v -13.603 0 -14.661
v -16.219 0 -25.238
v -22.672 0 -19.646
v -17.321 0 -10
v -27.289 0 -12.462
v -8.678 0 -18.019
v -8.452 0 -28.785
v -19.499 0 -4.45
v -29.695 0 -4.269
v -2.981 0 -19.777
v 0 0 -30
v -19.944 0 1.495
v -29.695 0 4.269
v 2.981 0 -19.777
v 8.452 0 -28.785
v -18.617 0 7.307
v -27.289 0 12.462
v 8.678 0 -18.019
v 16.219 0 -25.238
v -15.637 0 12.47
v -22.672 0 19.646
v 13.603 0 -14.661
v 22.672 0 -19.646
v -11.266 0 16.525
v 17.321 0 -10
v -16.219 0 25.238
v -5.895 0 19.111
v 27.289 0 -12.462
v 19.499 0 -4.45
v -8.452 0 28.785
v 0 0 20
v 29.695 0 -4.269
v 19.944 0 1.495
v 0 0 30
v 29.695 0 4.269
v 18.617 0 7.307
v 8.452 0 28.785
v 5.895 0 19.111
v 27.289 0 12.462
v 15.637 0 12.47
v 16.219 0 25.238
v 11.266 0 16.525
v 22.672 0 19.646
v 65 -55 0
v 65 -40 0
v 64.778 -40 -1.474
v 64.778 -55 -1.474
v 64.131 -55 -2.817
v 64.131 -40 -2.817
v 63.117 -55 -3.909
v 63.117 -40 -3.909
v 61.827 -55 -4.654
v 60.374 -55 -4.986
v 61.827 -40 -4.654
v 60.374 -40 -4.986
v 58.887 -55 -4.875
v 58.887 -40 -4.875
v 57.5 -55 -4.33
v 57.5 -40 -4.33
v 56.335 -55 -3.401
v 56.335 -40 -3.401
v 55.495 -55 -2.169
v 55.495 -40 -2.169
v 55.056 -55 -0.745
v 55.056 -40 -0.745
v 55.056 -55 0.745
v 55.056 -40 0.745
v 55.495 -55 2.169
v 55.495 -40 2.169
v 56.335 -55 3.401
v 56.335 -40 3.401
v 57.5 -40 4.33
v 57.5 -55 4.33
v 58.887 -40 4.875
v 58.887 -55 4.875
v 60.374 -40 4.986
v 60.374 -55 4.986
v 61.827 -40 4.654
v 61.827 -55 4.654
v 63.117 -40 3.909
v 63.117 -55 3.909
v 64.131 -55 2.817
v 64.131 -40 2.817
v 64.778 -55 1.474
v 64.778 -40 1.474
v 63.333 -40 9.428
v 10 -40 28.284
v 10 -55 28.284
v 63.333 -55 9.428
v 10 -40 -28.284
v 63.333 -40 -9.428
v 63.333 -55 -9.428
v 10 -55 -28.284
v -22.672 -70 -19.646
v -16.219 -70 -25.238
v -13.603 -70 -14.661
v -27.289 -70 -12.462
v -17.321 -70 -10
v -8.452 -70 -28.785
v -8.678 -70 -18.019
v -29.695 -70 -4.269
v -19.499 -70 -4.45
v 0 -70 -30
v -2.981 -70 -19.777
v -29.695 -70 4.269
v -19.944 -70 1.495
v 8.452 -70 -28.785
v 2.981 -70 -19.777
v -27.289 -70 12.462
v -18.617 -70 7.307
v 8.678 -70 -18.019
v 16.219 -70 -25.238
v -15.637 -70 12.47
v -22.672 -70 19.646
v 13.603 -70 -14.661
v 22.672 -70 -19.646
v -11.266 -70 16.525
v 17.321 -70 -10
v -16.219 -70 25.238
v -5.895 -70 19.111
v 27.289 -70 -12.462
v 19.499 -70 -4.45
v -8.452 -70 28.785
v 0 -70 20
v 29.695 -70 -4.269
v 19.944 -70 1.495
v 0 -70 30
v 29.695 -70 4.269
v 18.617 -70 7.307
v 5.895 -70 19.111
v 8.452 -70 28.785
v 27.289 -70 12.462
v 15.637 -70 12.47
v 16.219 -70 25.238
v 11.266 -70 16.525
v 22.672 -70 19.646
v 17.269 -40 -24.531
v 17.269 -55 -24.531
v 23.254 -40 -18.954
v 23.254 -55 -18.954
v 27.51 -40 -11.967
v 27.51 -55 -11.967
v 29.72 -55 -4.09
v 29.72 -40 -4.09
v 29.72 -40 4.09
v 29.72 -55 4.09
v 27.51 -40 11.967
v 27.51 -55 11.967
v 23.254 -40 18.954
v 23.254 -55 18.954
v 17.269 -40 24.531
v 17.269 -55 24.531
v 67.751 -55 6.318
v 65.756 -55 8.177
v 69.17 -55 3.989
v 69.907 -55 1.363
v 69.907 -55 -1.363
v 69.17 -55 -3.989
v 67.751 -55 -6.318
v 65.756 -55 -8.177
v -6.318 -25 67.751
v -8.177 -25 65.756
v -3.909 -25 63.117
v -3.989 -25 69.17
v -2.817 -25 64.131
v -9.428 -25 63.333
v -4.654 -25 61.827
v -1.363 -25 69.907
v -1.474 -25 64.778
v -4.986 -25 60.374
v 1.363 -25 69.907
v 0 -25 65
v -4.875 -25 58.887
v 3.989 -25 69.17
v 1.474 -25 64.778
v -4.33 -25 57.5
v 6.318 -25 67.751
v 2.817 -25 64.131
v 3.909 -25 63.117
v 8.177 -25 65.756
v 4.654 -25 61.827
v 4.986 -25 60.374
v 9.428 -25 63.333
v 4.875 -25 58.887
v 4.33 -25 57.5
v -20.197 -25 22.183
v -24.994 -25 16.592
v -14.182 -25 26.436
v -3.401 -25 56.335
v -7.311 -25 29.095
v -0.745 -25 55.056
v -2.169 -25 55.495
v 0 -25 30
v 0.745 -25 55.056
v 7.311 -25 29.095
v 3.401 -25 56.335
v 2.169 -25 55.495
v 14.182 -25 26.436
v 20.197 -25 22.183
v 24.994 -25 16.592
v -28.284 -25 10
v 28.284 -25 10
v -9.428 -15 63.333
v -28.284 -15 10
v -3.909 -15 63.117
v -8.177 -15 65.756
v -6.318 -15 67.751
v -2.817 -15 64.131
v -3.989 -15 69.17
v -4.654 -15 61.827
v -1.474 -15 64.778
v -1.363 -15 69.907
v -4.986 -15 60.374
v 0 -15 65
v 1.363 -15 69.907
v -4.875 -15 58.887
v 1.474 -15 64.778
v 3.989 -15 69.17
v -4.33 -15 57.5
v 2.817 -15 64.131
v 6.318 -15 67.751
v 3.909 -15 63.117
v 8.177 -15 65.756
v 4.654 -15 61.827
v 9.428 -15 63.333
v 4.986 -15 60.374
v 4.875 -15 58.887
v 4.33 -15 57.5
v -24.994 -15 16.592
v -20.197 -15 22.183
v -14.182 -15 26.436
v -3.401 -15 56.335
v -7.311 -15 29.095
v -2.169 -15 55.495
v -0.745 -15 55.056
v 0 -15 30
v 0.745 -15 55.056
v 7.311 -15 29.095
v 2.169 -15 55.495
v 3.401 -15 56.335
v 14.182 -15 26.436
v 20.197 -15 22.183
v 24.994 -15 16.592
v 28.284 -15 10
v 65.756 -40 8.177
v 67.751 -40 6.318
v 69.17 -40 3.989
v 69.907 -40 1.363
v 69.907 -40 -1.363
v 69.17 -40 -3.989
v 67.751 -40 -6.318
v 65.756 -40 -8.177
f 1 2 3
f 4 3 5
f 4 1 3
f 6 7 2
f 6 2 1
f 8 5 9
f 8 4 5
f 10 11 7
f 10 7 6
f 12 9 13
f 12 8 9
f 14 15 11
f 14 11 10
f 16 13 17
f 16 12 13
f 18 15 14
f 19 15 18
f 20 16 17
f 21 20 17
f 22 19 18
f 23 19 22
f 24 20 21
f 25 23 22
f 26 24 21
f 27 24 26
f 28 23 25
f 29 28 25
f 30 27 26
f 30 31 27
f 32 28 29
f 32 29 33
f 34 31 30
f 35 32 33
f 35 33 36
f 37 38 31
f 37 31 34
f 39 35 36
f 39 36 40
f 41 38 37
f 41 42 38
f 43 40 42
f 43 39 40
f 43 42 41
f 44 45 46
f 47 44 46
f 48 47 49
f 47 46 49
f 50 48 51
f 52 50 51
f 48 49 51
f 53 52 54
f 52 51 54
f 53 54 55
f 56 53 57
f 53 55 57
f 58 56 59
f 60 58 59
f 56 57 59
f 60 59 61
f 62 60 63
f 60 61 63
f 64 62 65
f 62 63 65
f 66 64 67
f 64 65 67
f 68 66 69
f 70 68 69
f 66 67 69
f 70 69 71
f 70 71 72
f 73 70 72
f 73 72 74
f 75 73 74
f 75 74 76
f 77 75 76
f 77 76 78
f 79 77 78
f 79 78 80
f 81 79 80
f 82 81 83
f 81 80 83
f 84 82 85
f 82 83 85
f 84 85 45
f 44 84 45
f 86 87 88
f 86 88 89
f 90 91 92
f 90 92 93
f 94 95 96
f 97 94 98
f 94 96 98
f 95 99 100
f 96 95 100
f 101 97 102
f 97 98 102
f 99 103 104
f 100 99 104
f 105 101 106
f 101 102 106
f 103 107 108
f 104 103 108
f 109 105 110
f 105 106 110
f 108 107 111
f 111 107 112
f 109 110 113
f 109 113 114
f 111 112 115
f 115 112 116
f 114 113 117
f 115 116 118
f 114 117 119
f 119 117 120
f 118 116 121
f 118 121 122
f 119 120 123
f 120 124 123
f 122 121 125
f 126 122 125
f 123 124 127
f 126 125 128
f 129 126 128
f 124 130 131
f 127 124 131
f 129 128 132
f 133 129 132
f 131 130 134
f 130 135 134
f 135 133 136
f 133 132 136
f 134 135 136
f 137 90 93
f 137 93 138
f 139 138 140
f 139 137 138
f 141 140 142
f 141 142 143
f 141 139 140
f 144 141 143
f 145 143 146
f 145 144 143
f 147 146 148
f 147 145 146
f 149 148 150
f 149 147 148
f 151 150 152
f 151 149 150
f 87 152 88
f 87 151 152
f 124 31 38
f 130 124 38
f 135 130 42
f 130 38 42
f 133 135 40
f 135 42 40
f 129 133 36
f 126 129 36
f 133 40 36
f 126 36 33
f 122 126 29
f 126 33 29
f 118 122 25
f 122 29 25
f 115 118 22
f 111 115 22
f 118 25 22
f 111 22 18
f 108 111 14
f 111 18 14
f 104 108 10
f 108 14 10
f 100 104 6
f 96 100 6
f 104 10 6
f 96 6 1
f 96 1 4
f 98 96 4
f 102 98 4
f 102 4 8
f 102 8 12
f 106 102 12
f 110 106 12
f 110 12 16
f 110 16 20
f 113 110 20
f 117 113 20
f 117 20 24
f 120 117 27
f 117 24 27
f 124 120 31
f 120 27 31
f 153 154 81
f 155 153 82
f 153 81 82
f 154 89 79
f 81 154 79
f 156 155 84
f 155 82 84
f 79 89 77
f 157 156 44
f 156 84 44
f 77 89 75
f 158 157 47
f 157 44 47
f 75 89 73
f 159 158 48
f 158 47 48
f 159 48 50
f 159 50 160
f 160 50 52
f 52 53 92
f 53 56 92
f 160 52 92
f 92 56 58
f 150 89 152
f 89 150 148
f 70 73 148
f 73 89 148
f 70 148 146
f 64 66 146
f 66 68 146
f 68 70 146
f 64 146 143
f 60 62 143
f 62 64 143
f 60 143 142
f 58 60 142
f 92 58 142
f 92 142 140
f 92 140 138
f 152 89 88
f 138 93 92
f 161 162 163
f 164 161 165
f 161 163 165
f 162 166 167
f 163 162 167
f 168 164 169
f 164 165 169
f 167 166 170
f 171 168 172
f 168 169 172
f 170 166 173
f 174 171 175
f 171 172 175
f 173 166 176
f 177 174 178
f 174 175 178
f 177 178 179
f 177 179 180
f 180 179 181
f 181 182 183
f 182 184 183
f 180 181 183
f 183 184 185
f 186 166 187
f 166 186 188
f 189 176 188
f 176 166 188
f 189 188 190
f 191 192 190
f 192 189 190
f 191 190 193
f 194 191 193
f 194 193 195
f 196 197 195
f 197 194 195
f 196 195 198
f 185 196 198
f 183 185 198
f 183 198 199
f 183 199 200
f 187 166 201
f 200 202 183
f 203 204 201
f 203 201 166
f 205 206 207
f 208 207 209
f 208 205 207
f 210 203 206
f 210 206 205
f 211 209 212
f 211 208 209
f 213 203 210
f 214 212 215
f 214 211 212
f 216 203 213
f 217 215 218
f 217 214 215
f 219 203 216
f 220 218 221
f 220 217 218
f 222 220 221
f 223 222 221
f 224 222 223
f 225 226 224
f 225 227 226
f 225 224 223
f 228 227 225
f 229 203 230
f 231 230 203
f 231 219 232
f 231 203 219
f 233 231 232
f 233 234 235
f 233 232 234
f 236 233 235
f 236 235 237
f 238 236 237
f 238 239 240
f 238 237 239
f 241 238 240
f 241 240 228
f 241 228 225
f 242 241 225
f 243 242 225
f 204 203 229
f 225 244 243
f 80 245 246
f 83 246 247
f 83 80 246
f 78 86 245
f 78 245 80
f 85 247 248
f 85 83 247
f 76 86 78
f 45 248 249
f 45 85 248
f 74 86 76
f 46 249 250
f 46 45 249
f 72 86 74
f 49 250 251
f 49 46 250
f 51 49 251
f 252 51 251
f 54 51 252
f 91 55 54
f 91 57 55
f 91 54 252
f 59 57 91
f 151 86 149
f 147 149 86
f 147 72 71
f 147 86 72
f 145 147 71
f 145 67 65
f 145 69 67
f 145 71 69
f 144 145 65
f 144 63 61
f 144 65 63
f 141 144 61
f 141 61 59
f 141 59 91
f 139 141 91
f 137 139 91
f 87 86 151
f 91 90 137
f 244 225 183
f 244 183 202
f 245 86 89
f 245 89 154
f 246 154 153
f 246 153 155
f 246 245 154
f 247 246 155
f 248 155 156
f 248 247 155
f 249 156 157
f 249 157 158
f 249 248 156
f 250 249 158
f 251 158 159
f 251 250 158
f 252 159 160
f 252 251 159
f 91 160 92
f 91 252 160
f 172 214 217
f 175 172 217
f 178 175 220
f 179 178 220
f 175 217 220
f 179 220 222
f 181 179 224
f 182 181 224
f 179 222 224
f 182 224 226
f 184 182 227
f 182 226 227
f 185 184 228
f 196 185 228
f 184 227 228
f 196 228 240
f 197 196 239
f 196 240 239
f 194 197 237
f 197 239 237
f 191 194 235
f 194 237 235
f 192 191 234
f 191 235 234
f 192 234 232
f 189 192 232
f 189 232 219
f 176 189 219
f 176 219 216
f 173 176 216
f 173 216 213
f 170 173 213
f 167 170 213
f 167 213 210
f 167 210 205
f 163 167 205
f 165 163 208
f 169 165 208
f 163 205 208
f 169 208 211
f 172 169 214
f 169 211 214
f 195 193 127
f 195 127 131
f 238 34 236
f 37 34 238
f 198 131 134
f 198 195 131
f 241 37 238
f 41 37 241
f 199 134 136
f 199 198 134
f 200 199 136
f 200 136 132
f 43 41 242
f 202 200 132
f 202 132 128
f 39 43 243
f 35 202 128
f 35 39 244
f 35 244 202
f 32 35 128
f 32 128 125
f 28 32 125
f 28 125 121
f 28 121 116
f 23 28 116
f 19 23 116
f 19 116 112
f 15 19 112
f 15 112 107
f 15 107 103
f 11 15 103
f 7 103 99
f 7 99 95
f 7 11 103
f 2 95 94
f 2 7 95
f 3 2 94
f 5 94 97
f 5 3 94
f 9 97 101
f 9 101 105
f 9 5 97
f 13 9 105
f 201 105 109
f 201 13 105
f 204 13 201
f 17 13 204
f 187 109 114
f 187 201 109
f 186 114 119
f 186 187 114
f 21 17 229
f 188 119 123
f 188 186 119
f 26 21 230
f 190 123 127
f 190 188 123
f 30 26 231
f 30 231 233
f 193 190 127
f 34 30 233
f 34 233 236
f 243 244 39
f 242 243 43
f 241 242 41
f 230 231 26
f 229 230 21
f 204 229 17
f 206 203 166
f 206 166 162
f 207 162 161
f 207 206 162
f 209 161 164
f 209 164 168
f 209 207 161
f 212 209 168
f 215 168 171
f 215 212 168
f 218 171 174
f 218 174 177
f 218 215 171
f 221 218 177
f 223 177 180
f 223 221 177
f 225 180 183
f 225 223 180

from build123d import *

# Parameters (mm, degrees)
SKETCH1_R             = 30
SKETCH1_R_2           = 20
BOSS_EXTRUDE1_DEPTH   = 70
BOSS_EXTRUDE2_START   = -15
SKETCH2_R             = 5
BOSS_EXTRUDE2_DEPTH   = 10
BOSS_EXTRUDE3_START   = -40
SKETCH2_3_R           = 5
BOSS_EXTRUDE3_DEPTH   = 15
BODY_MOVE_COPY1_ANGLE = 90


with BuildPart() as part:
    # Sketch1 → Boss-Extrude1 (new body)
    with BuildSketch(Plane(origin=(0, 0, 0), x_dir=(1, 0, 0), z_dir=(0, 1, 0))):
        Circle(SKETCH1_R)
        Circle(SKETCH1_R_2, mode=Mode.SUBTRACT)
    extrude(amount=-BOSS_EXTRUDE1_DEPTH)

    # Sketch2 → Boss-Extrude2 (add)
    with BuildSketch(Plane(origin=(0, 0, 0), x_dir=(1, 0, 0), z_dir=(0, 1, 0)).offset(BOSS_EXTRUDE2_START)):
        with BuildLine():
            ThreePointArc((28.284271247, -10), (0, -30), (-28.284271247, -10))
            Line((-28.284271247, -10), (-9.428090416, -63.333333333))
            ThreePointArc((-9.428090416, -63.333333333), (0, -70), (9.428090416, -63.333333333))
            Line((9.428090416, -63.333333333), (28.284271247, -10))
        make_face()
        with Locations((0, -60)):
            Circle(SKETCH2_R, mode=Mode.SUBTRACT)
    extrude(amount=-BOSS_EXTRUDE2_DEPTH)


with BuildPart() as body_2:
    # Sketch2<3> → Boss-Extrude3 (new body)
    with BuildSketch(Plane(origin=(0, 0, 0), x_dir=(1, 0, 0), z_dir=(0, 1, 0)).offset(BOSS_EXTRUDE3_START)):
        with BuildLine():
            ThreePointArc((28.284271247, -10), (0, -30), (-28.284271247, -10))
            Line((-28.284271247, -10), (-9.428090416, -63.333333333))
            ThreePointArc((-9.428090416, -63.333333333), (0, -70), (9.428090416, -63.333333333))
            Line((9.428090416, -63.333333333), (28.284271247, -10))
        make_face()
        with Locations((0, -60)):
            Circle(SKETCH2_3_R, mode=Mode.SUBTRACT)
    extrude(amount=-BOSS_EXTRUDE3_DEPTH)


with BuildPart() as body_2_1:
    # Body-Move/Copy1: moved
    add(body_2.part.rotate(Axis((0, 0, 0), (0, 1, 0)), BODY_MOVE_COPY1_ANGLE))


solid = Compound([part.part, body_2_1.part])
